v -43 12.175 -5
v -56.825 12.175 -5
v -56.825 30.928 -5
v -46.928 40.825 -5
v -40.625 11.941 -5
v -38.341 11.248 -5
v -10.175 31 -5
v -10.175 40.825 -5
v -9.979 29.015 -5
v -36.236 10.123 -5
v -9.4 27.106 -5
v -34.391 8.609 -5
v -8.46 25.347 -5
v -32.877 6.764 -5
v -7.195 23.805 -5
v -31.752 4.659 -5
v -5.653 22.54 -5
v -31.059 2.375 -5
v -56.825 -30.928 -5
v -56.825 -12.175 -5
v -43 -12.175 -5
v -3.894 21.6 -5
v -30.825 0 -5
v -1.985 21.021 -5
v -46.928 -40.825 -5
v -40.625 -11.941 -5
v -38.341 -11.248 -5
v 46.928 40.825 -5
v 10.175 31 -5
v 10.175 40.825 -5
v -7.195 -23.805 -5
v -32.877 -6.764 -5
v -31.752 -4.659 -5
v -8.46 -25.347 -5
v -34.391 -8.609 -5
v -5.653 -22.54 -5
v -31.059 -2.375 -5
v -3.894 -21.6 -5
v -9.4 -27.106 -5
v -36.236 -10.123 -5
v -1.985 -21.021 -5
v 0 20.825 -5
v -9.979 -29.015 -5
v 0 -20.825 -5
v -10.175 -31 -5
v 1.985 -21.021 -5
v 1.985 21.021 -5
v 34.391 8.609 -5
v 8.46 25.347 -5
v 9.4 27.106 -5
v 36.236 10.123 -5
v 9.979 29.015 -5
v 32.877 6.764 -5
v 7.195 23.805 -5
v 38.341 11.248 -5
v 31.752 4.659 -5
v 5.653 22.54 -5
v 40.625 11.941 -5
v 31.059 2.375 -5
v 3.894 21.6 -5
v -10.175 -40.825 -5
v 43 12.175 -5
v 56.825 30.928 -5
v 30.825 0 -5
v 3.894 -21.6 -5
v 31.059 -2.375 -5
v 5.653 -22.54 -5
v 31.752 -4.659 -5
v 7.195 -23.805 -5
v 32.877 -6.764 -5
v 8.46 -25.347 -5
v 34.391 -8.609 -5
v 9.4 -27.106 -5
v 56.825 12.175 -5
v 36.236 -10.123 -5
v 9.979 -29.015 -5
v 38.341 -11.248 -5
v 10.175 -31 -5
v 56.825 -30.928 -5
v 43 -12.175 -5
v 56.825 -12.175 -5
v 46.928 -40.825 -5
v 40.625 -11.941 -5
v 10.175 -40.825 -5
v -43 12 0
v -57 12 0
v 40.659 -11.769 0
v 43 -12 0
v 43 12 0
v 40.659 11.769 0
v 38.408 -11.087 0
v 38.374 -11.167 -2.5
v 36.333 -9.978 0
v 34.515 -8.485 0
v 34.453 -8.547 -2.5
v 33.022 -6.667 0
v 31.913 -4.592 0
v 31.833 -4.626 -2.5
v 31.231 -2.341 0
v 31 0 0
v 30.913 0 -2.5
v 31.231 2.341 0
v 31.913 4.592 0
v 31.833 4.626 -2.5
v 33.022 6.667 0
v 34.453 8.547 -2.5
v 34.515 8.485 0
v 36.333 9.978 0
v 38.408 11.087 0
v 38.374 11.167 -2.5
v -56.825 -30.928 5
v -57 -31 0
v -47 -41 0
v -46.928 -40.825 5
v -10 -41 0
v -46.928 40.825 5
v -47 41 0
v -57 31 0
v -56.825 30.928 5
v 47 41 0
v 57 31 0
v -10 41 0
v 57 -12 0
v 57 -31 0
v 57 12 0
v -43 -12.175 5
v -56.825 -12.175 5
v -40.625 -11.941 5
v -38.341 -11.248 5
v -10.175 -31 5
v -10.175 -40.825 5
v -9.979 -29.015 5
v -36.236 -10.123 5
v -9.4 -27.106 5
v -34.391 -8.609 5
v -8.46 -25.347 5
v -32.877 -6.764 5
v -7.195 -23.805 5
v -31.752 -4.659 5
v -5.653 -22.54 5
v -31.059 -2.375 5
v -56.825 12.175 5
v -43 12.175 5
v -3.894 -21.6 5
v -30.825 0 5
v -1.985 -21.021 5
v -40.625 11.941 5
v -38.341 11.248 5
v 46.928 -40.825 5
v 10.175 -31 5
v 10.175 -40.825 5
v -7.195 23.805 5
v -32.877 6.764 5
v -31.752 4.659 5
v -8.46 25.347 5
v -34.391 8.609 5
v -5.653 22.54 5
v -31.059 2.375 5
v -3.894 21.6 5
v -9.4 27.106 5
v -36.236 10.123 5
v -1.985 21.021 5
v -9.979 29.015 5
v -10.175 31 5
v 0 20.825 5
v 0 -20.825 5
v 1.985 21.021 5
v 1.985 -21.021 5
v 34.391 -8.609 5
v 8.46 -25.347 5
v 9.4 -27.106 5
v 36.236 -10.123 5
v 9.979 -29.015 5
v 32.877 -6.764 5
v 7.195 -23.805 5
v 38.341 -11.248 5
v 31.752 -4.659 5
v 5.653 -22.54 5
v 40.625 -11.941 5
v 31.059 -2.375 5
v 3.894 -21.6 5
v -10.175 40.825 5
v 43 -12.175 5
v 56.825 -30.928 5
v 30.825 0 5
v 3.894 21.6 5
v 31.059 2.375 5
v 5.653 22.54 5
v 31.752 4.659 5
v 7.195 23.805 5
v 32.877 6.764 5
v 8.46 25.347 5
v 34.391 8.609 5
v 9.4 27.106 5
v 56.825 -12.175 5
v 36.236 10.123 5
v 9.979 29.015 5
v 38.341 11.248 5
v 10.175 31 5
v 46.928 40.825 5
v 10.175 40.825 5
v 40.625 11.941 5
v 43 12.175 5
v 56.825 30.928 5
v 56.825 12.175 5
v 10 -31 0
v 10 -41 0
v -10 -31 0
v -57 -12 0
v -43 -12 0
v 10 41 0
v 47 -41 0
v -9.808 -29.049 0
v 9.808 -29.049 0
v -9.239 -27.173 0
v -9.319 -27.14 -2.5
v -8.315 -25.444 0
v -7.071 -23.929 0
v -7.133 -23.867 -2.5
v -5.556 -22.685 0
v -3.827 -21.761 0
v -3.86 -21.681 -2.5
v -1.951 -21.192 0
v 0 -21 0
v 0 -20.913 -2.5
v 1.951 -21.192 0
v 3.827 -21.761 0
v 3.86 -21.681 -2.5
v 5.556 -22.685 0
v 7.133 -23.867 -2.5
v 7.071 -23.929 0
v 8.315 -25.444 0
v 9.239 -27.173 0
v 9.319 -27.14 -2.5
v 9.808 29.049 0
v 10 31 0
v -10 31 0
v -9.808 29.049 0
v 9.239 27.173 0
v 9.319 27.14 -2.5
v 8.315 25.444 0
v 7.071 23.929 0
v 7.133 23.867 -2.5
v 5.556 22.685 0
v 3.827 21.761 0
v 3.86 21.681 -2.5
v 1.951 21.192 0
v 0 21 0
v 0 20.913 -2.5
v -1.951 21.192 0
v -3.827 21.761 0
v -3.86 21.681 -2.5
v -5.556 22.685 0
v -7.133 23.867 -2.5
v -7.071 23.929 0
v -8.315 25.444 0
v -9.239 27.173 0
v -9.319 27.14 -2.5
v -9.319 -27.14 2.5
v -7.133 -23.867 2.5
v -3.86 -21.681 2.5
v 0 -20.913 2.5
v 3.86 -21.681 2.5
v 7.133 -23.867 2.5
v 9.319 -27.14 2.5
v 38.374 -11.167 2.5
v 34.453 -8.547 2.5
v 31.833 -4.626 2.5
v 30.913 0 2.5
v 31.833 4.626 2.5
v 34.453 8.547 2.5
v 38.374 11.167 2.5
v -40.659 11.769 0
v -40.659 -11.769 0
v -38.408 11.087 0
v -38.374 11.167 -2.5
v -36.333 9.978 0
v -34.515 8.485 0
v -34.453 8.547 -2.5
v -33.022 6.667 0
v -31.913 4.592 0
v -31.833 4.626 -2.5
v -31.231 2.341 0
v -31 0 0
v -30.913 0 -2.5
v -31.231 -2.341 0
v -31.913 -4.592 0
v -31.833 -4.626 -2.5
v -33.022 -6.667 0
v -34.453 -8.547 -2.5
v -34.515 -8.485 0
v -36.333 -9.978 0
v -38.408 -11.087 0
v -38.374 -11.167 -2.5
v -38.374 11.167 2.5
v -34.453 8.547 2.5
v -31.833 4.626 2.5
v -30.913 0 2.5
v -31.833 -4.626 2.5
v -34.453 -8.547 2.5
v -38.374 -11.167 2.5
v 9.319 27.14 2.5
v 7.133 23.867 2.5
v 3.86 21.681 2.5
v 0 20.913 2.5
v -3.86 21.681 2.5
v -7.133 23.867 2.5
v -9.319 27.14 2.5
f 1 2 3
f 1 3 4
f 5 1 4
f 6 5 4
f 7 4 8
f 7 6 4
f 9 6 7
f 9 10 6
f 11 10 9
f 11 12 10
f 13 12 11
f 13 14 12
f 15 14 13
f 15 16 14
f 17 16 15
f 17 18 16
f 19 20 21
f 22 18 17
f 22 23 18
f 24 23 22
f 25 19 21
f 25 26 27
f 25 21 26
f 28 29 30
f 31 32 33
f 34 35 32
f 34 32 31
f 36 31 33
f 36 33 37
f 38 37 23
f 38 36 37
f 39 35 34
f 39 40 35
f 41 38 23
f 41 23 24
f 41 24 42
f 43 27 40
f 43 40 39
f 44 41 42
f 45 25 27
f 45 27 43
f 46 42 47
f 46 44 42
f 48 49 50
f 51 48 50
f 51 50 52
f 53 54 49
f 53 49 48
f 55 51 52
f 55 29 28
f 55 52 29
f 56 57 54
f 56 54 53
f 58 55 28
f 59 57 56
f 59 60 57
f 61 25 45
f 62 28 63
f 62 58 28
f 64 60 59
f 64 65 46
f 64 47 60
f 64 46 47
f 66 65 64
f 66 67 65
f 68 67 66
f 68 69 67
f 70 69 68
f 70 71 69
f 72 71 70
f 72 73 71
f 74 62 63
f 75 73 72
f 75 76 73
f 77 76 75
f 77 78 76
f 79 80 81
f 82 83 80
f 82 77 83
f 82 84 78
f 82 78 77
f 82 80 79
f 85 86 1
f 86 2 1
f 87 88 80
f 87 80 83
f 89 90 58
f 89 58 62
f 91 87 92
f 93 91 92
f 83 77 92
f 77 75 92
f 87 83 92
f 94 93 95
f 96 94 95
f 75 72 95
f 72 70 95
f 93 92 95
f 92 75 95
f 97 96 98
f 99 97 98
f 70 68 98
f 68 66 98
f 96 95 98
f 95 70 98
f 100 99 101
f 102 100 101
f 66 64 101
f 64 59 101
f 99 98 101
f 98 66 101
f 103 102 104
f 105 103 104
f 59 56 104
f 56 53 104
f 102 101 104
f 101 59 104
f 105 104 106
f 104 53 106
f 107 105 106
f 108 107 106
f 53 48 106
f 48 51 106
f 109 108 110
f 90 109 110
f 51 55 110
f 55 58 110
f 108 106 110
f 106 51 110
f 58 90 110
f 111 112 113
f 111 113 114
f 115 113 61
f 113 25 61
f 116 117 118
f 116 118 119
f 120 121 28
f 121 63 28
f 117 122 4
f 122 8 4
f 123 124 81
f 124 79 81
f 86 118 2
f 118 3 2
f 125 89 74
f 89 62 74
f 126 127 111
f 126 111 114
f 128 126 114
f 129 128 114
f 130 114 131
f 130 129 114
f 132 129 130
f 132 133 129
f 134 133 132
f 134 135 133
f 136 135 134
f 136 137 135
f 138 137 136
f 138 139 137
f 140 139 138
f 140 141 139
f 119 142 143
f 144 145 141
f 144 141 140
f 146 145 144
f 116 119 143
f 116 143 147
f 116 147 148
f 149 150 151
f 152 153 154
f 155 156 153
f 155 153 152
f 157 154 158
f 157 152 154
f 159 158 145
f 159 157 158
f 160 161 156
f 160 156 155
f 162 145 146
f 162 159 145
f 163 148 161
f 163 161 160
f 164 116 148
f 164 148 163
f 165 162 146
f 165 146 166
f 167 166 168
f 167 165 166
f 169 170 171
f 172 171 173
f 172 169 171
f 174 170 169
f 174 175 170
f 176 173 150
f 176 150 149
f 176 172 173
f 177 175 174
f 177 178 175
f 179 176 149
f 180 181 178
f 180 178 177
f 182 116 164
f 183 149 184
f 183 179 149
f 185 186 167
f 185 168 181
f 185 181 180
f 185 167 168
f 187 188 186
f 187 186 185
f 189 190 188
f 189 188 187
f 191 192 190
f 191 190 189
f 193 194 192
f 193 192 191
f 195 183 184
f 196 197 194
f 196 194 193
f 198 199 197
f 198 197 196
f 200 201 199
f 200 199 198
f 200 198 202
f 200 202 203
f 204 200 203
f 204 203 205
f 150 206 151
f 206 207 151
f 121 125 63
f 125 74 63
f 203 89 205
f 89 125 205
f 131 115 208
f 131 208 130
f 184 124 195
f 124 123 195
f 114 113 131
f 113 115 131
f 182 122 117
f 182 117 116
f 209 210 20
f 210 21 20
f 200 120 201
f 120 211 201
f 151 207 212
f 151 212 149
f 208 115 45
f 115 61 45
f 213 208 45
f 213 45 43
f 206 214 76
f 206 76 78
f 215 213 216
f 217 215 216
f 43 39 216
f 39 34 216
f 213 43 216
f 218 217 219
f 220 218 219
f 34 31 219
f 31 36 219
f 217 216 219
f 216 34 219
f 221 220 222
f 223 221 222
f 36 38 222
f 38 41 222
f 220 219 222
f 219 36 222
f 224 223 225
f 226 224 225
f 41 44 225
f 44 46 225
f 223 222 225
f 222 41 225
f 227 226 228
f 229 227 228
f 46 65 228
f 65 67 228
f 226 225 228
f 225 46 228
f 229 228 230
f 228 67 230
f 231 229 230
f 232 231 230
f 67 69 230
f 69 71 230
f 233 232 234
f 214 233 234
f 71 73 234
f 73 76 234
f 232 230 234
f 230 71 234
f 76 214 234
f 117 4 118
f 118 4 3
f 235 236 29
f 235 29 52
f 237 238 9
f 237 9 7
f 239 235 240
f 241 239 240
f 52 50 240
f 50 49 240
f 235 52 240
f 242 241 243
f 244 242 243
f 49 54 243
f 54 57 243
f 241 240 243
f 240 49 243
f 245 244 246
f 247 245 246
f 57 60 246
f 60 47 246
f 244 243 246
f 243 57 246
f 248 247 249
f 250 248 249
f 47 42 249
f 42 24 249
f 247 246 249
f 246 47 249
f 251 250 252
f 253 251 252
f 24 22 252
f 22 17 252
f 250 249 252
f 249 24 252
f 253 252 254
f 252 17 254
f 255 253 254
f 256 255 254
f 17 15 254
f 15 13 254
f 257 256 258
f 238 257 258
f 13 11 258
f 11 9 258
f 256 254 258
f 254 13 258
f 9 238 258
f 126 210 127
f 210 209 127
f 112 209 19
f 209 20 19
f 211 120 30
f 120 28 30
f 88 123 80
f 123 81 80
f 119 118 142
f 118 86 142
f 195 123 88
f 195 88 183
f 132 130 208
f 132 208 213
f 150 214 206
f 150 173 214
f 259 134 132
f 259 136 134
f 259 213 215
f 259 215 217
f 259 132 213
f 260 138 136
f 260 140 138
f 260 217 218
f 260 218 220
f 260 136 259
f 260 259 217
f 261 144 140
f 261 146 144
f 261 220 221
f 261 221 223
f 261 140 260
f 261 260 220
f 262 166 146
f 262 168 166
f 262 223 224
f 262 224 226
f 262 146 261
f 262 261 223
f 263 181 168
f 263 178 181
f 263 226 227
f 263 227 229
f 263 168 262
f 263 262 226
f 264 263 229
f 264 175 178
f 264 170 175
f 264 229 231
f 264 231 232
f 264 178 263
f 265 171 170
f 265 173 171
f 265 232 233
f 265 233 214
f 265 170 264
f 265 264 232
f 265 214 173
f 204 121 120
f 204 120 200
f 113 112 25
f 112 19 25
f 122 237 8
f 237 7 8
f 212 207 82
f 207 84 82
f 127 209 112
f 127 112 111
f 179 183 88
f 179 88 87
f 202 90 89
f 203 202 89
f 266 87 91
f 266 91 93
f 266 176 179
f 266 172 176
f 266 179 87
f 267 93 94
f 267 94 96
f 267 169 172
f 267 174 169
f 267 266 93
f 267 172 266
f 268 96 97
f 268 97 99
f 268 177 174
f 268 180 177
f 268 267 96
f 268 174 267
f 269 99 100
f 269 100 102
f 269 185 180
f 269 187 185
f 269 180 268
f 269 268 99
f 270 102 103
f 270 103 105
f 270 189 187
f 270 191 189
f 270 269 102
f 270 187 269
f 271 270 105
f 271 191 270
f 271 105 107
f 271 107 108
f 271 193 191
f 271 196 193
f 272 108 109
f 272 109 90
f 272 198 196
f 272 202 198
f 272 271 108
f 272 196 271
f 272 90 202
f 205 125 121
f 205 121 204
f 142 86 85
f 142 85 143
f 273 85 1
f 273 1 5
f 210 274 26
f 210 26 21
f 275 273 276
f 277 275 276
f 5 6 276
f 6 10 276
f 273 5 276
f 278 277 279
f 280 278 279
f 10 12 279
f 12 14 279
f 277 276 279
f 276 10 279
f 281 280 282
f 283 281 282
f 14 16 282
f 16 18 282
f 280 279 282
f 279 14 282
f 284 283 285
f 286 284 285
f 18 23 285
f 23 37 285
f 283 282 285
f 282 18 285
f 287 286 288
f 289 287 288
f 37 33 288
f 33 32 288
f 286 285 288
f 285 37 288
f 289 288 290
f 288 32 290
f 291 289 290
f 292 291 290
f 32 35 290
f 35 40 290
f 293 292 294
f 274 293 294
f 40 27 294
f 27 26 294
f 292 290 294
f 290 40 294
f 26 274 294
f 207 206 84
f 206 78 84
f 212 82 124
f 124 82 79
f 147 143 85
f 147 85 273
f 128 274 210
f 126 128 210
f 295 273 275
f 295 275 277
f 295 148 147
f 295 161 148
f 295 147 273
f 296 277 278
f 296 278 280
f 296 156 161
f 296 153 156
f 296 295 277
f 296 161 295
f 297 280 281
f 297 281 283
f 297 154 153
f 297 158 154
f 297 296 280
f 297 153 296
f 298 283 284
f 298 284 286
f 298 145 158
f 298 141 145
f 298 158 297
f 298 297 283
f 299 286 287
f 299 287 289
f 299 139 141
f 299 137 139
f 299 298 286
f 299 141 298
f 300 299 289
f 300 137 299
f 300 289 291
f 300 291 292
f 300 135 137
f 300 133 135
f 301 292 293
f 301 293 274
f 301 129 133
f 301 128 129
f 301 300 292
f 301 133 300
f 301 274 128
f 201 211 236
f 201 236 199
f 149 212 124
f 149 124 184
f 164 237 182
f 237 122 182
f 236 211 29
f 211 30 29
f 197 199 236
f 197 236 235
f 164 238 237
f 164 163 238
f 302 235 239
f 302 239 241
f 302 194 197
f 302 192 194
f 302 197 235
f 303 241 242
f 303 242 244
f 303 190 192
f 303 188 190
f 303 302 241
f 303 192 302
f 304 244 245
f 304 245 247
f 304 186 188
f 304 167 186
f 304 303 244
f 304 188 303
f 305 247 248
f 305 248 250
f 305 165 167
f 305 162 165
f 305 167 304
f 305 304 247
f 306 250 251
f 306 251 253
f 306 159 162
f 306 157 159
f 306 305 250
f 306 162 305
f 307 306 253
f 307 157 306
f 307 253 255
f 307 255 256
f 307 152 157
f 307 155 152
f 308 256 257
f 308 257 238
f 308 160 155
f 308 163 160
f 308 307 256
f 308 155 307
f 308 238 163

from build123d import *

# Parameters (mm, degrees)
BOSS_EXTRUDE1_DEPTH           = 5
BOSS_EXTRUDE1_TAPER           = 2
BOSS_EXTRUDE1_OTHER_WAY_DEPTH = 5
BOSS_EXTRUDE1_OTHER_WAY_TAPER = 2


with BuildPart() as part:
    # Sketch1 → Boss-Extrude1 (new body)
    with BuildSketch(Plane.XY):
        with BuildLine():
            Line((47, 41), (10, 41))
            Line((10, 41), (10, 31))
            ThreePointArc((10, 31), (0, 21), (-10, 31))
            Line((-10, 31), (-10, 41))
            Line((-10, 41), (-47, 41))
            Line((-47, 41), (-57, 31))
            Line((-57, 31), (-57, 12))
            Line((-57, 12), (-43, 12))
            ThreePointArc((-43, 12), (-31, 0), (-43, -12))
            Line((-43, -12), (-57, -12))
            Line((-57, -12), (-57, -31))
            Line((-57, -31), (-47, -41))
            Line((-47, -41), (-10, -41))
            Line((-10, -41), (-10, -31))
            ThreePointArc((-10, -31), (0, -21), (10, -31))
            Line((10, -31), (10, -41))
            Line((10, -41), (47, -41))
            Line((47, -41), (57, -31))
            Line((57, -31), (57, -12))
            Line((57, -12), (43, -12))
            ThreePointArc((43, -12), (31, 0), (43, 12))
            Line((43, 12), (57, 12))
            Line((57, 12), (57, 31))
            Line((57, 31), (47, 41))
        make_face()
    extrude(amount=BOSS_EXTRUDE1_DEPTH, taper=BOSS_EXTRUDE1_TAPER)

    # Sketch1 → Boss-Extrude1 other way (add)
    with BuildSketch(Plane.XY):
        with BuildLine():
            Line((47, 41), (10, 41))
            Line((10, 41), (10, 31))
            ThreePointArc((10, 31), (0, 21), (-10, 31))
            Line((-10, 31), (-10, 41))
            Line((-10, 41), (-47, 41))
            Line((-47, 41), (-57, 31))
            Line((-57, 31), (-57, 12))
            Line((-57, 12), (-43, 12))
            ThreePointArc((-43, 12), (-31, 0), (-43, -12))
            Line((-43, -12), (-57, -12))
            Line((-57, -12), (-57, -31))
            Line((-57, -31), (-47, -41))
            Line((-47, -41), (-10, -41))
            Line((-10, -41), (-10, -31))
            ThreePointArc((-10, -31), (0, -21), (10, -31))
            Line((10, -31), (10, -41))
            Line((10, -41), (47, -41))
            Line((47, -41), (57, -31))
            Line((57, -31), (57, -12))
            Line((57, -12), (43, -12))
            ThreePointArc((43, -12), (31, 0), (43, 12))
            Line((43, 12), (57, 12))
            Line((57, 12), (57, 31))
            Line((57, 31), (47, 41))
        make_face()
    extrude(amount=-BOSS_EXTRUDE1_OTHER_WAY_DEPTH, taper=BOSS_EXTRUDE1_OTHER_WAY_TAPER)


solid = part.part
